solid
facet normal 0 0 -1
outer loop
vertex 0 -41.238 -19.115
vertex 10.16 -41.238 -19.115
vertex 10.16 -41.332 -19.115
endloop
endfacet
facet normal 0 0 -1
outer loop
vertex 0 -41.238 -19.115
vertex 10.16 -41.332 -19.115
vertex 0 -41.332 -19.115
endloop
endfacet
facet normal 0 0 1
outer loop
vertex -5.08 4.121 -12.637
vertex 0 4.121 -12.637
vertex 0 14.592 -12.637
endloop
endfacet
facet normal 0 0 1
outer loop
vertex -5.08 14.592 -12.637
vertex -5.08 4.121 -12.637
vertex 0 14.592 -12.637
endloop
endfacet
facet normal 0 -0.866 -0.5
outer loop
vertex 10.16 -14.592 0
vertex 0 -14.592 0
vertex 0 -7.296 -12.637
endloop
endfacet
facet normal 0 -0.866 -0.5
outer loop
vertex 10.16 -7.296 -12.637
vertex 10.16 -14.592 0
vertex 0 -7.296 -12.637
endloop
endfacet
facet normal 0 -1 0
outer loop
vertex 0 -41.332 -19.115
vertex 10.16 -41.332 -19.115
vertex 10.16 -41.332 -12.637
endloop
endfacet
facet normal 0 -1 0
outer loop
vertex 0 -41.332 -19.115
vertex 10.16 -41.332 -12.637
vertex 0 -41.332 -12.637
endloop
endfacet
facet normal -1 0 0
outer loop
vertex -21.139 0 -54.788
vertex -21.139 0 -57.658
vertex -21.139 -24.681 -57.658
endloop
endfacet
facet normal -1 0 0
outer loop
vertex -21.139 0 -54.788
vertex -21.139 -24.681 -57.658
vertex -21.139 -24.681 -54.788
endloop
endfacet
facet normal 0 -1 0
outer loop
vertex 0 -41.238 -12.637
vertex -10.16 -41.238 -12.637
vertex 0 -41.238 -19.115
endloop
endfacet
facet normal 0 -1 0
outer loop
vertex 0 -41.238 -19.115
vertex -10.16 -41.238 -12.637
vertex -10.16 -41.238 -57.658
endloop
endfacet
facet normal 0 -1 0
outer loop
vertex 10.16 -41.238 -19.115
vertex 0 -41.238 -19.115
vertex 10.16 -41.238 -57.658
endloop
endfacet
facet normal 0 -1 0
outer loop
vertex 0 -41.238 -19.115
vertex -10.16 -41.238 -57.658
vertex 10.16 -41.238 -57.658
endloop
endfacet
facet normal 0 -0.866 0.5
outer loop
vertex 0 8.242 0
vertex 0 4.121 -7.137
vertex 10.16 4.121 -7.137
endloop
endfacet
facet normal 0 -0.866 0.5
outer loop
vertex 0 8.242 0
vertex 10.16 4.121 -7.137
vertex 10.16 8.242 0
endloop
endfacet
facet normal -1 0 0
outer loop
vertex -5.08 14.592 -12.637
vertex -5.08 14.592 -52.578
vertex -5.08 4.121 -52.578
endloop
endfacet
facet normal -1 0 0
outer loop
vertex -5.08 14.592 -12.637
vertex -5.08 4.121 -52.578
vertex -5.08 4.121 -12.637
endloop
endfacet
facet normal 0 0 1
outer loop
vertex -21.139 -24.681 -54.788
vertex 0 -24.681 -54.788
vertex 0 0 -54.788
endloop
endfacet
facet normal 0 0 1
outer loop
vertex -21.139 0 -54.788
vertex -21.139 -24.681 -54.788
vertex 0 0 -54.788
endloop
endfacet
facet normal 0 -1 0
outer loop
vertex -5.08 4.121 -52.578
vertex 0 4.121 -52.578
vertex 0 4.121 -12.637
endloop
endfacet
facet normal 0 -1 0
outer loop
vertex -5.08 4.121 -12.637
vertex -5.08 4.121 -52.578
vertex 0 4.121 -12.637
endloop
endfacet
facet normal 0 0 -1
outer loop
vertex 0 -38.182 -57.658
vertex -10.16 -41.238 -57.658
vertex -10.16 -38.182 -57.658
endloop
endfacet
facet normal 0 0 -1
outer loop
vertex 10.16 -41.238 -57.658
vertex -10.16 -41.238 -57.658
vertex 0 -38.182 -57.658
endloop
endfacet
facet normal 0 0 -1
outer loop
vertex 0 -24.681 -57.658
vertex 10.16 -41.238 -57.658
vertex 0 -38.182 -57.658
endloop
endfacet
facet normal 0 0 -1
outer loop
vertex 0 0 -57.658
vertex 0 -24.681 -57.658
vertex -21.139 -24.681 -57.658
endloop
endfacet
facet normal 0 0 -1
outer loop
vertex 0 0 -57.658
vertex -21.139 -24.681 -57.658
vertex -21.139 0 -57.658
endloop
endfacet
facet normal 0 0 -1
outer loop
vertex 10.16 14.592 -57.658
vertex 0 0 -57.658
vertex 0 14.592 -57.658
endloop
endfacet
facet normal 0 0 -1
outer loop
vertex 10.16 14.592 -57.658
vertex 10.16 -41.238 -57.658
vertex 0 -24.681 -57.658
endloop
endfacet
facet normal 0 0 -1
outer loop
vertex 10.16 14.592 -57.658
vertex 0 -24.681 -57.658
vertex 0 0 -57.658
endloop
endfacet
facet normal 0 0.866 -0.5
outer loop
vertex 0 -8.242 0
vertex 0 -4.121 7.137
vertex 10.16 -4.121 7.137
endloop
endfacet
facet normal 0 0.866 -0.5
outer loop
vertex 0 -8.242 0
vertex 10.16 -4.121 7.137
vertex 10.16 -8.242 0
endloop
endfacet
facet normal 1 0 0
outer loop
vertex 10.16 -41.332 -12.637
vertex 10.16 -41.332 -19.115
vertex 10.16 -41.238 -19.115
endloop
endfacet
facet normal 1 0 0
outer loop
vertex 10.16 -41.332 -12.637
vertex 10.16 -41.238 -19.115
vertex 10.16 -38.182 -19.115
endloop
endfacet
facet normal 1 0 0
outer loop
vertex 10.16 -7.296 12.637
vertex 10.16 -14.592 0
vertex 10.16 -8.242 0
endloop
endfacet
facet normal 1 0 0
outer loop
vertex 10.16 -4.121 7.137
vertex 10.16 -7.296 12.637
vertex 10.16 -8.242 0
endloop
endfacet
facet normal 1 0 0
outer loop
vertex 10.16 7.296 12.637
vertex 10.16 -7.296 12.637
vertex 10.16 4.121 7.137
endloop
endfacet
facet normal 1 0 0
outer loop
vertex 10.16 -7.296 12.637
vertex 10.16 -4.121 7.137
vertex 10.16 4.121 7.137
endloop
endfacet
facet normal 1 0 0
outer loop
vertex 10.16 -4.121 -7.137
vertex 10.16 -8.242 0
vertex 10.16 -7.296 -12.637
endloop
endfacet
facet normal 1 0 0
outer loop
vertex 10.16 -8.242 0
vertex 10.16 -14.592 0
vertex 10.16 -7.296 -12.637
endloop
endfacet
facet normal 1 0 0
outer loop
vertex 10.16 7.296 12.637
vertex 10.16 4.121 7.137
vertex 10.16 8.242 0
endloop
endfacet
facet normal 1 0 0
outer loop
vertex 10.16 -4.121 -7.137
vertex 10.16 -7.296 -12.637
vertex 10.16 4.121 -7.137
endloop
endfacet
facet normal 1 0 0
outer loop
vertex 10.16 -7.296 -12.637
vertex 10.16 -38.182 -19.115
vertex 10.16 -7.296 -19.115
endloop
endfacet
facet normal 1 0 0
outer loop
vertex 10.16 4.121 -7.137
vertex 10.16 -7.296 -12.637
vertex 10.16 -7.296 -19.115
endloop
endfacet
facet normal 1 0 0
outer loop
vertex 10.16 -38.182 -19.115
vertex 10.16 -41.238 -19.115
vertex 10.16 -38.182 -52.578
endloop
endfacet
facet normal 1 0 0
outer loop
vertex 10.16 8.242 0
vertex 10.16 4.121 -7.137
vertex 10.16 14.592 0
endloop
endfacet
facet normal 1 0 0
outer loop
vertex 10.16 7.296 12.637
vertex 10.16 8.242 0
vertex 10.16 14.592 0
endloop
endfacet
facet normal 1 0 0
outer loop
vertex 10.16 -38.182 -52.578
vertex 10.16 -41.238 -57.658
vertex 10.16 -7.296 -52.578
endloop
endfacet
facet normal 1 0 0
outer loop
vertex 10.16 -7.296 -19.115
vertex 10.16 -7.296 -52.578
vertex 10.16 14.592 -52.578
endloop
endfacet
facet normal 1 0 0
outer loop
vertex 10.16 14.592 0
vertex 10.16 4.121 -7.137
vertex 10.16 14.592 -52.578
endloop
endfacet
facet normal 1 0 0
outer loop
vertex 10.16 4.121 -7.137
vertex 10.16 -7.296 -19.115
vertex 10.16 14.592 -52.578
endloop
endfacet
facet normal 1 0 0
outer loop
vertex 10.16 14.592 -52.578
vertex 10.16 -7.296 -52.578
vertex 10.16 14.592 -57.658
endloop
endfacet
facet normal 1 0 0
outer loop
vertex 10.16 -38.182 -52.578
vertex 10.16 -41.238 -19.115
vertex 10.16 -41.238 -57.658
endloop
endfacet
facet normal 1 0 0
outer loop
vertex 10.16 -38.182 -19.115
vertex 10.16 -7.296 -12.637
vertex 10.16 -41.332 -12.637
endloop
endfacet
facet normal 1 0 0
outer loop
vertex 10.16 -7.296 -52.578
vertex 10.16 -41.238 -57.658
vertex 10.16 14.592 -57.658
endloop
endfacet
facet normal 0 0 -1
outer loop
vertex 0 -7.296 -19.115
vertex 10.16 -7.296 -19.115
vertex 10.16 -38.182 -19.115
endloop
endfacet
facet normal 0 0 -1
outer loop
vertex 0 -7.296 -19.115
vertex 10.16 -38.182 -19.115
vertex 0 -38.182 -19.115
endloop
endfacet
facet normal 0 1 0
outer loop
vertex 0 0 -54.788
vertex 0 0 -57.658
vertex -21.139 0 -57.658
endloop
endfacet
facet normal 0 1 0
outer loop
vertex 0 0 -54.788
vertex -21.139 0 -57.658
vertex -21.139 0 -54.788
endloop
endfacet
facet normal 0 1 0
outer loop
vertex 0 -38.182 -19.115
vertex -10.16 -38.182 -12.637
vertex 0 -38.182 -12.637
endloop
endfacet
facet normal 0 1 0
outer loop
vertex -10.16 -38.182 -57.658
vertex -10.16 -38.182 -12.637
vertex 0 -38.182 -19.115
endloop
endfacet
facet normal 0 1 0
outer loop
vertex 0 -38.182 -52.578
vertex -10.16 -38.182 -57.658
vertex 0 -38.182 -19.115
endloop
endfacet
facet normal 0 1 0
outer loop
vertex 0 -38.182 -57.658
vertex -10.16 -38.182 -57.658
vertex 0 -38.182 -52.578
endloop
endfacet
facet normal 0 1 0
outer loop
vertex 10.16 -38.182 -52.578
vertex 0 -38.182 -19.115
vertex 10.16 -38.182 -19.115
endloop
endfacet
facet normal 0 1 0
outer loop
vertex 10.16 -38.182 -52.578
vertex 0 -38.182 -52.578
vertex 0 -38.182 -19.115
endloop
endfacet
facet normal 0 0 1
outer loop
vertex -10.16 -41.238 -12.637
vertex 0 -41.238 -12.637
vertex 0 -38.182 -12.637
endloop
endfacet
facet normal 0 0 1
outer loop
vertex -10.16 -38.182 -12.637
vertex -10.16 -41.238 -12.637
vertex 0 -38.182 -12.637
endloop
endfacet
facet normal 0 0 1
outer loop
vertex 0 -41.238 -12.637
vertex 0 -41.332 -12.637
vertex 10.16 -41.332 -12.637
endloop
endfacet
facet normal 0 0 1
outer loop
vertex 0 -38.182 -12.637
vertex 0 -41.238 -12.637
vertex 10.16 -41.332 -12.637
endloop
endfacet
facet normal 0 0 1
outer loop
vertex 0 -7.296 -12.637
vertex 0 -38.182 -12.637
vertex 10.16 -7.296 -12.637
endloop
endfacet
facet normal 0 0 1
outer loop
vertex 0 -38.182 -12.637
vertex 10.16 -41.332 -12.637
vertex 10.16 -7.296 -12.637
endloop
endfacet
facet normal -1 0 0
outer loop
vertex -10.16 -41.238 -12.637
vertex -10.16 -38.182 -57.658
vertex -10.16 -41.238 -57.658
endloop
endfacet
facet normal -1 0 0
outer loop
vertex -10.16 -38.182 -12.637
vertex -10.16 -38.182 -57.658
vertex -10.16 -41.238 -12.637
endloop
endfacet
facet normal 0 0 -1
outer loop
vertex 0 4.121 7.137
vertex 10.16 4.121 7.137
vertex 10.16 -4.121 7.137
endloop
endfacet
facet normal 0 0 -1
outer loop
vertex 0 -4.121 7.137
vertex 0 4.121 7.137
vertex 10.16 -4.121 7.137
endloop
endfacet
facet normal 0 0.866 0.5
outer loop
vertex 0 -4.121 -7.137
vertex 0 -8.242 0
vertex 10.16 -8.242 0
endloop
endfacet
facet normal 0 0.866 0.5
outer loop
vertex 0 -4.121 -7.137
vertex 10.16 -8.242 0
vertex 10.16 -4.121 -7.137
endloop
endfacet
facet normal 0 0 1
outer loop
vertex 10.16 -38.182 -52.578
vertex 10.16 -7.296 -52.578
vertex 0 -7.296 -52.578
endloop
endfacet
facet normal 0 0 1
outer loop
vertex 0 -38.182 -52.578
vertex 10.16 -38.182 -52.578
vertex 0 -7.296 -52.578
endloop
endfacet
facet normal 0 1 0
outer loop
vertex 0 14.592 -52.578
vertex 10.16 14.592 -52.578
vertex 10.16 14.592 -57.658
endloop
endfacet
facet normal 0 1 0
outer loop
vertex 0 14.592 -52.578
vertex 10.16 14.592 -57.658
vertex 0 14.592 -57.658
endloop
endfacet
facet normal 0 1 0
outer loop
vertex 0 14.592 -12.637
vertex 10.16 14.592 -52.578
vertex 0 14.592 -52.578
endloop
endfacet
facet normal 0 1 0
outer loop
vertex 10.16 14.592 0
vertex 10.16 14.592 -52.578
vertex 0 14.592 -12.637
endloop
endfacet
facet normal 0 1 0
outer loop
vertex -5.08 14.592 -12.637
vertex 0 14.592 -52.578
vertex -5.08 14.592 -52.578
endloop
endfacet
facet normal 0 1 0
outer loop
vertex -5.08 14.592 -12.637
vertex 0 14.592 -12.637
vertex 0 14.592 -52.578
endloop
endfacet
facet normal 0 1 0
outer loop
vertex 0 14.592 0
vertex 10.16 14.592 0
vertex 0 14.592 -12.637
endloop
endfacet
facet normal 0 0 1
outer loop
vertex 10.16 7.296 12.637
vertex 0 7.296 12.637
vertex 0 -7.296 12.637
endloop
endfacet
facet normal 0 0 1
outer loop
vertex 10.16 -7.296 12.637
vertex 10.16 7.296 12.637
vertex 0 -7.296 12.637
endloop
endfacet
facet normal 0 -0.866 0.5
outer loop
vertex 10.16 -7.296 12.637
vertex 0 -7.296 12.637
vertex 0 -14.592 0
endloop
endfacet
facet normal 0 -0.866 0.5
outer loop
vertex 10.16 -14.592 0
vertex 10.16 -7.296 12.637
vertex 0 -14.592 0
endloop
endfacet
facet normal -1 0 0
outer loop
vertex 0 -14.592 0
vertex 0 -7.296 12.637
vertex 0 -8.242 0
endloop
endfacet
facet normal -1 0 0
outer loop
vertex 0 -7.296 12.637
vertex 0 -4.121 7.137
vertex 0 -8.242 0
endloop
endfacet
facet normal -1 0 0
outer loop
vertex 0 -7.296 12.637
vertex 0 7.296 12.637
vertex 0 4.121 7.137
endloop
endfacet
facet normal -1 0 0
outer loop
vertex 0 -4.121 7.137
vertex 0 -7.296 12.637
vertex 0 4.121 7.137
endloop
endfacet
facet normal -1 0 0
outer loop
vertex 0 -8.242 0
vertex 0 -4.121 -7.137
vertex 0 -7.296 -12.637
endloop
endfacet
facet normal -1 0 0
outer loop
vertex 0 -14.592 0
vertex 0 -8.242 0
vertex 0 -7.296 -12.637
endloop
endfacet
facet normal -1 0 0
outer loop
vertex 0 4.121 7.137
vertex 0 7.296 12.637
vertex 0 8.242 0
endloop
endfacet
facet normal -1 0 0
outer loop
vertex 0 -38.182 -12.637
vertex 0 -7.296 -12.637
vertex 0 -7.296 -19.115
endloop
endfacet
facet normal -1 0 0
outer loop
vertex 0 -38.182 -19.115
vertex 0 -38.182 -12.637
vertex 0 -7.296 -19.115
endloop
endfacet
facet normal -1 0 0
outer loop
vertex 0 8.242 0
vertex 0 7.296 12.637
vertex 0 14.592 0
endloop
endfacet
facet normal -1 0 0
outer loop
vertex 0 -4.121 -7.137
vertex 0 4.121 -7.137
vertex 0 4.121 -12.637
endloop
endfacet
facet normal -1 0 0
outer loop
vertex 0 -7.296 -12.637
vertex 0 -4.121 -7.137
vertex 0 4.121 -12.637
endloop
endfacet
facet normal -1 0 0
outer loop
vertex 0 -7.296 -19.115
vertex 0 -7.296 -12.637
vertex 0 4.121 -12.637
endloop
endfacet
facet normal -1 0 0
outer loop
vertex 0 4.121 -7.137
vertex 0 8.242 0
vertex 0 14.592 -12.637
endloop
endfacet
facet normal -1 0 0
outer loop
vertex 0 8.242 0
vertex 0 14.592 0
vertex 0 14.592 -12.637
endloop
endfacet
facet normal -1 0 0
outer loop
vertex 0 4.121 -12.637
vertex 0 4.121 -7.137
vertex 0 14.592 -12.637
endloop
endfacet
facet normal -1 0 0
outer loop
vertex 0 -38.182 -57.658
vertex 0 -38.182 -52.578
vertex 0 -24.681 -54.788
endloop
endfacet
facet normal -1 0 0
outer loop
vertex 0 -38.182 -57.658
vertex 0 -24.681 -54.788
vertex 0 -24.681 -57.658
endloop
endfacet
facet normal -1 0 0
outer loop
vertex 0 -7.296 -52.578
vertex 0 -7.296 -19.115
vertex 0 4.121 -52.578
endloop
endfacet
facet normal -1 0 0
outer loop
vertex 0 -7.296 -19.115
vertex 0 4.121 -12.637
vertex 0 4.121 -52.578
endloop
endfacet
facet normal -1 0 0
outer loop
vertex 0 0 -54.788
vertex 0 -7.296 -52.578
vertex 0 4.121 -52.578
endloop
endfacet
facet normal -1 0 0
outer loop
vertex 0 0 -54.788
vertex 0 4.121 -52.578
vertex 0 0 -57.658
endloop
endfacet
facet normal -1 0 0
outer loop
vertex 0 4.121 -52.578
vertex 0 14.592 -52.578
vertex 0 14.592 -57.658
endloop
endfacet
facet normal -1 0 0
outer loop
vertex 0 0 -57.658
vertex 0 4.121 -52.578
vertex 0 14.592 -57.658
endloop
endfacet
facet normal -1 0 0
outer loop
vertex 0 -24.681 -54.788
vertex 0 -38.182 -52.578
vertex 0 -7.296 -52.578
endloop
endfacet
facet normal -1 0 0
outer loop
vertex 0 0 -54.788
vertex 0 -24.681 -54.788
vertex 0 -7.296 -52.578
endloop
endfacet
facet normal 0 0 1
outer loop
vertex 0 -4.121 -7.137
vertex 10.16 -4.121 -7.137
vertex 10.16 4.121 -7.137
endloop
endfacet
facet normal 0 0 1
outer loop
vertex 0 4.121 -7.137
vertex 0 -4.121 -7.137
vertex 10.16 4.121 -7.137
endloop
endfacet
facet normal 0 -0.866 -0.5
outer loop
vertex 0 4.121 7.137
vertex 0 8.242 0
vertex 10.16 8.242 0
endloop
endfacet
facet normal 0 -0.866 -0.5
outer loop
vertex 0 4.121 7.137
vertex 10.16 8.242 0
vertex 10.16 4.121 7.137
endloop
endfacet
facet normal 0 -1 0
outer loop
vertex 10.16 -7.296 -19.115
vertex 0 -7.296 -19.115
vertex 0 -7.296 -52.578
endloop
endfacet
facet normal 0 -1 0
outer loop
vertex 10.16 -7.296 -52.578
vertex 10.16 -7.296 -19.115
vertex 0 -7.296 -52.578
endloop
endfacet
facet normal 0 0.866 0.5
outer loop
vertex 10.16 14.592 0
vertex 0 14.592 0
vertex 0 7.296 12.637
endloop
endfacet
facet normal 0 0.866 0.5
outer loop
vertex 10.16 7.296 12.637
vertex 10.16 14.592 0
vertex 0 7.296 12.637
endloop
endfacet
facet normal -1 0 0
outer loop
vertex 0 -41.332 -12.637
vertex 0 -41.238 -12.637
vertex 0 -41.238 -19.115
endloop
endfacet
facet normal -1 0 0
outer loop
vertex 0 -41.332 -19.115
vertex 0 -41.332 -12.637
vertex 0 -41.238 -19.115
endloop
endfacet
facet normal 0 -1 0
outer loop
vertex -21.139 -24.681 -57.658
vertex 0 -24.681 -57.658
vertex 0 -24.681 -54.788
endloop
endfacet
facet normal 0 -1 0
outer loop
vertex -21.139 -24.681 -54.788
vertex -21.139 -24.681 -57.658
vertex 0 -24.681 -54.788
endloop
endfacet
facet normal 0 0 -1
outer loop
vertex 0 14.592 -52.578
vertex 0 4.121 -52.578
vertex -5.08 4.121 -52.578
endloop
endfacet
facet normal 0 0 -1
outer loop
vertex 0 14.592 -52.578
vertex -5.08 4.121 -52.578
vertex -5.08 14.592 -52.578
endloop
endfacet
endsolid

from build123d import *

# Parameters (mm, degrees)
BOSS_EXTRUDE1_DEPTH = 10.16
BOSS_EXTRUDE2_DEPTH = 10.16
SKETCH4_W           = 39.941338686
SKETCH4_H           = 10.470779812
BOSS_EXTRUDE3_DEPTH = 5.08
SKETCH6_W           = 10.16
SKETCH6_H           = 55.829783289
BOSS_EXTRUDE5_DEPTH = 5.08
SKETCH9_W           = 10.16
SKETCH9_H           = 6.478239632
BOSS_EXTRUDE6_DEPTH = 34.036
SKETCH12_W          = 45.021338686
SKETCH12_H          = 3.055969703
BOSS_EXTRUDE7_DEPTH = 10.16
SKETCH13_W          = 10.16
SKETCH13_H          = 3.055969703
BOSS_EXTRUDE8_DEPTH = 33.528
SKETCH16_W          = 2.870015597
SKETCH16_H          = 24.680607417
BOSS_EXTRUDE9_DEPTH = 21.13915


with BuildPart() as part:
    # Sketch2 → Boss-Extrude1 (new body)
    with BuildSketch(Plane(origin=(0, 0, 0), x_dir=(0, 0, -1), z_dir=(1, 0, 0))):
        Polygon((0, 14.591559623), (-12.636661314, 7.295779811), (-12.636661314, -7.295779811), (0, -14.591559623), (12.636661314, -7.295779811), (12.636661314, 7.295779811), align=None)
        Polygon((0, 8.241559623), (-7.1374, 4.120779811), (-7.1374, -4.120779811), (0, -8.241559623), (7.1374, -4.120779811), (7.1374, 4.120779811), align=None, mode=Mode.SUBTRACT)
    extrude(amount=BOSS_EXTRUDE1_DEPTH)

    # Sketch3 → Boss-Extrude2 (add)
    with BuildSketch(Plane(origin=(0, 0, 0), x_dir=(0, 0, -1), z_dir=(1, 0, 0))):
        Polygon((12.636661314, -7.295779811), (52.578, -7.295779811), (52.578, 14.591559623), (0, 14.591559623), (12.636661314, 7.295779811), align=None)
    extrude(amount=BOSS_EXTRUDE2_DEPTH)

    # Sketch4 → Boss-Extrude3 (add)
    with BuildSketch(Plane.ZY):
        with Locations((-32.607330657, 9.356169717)):
            Rectangle(SKETCH4_W, SKETCH4_H)
    extrude(amount=BOSS_EXTRUDE3_DEPTH)

    # Sketch6 → Boss-Extrude5 (add)
    with BuildSketch(Plane(origin=(0, 0, -52.578), x_dir=(-1, 0, 0), z_dir=(0, 0, -1))):
        with Locations((-5.08, -13.323332022)):
            Rectangle(SKETCH6_W, SKETCH6_H)
    extrude(amount=BOSS_EXTRUDE5_DEPTH)

    # Sketch9 → Boss-Extrude6 (add)
    with BuildSketch(Plane(origin=(0, -7.295779811, 0), x_dir=(-1, 0, 0), z_dir=(0, -1, 0))):
        with Locations((-5.08, 15.87578113)):
            Rectangle(SKETCH9_W, SKETCH9_H)
    extrude(amount=BOSS_EXTRUDE6_DEPTH)

    # Sketch12 → Boss-Extrude7 (add)
    with BuildSketch(Plane.ZY):
        with Locations((-35.147330657, -39.710238815)):
            Rectangle(SKETCH12_W, SKETCH12_H)
    extrude(amount=BOSS_EXTRUDE7_DEPTH)

    # Sketch13 → Boss-Extrude8 (add)
    with BuildSketch(Plane.XY.offset(-52.578)):
        with Locations((5.08, -39.710238815)):
            Rectangle(SKETCH13_W, SKETCH13_H)
    extrude(amount=BOSS_EXTRUDE8_DEPTH)

    # Sketch16 → Boss-Extrude9 (add)
    with BuildSketch(Plane.ZY):
        with Locations((-56.222992202, -12.340303709)):
            Rectangle(SKETCH16_W, SKETCH16_H)
    extrude(amount=BOSS_EXTRUDE9_DEPTH)


solid = part.part
